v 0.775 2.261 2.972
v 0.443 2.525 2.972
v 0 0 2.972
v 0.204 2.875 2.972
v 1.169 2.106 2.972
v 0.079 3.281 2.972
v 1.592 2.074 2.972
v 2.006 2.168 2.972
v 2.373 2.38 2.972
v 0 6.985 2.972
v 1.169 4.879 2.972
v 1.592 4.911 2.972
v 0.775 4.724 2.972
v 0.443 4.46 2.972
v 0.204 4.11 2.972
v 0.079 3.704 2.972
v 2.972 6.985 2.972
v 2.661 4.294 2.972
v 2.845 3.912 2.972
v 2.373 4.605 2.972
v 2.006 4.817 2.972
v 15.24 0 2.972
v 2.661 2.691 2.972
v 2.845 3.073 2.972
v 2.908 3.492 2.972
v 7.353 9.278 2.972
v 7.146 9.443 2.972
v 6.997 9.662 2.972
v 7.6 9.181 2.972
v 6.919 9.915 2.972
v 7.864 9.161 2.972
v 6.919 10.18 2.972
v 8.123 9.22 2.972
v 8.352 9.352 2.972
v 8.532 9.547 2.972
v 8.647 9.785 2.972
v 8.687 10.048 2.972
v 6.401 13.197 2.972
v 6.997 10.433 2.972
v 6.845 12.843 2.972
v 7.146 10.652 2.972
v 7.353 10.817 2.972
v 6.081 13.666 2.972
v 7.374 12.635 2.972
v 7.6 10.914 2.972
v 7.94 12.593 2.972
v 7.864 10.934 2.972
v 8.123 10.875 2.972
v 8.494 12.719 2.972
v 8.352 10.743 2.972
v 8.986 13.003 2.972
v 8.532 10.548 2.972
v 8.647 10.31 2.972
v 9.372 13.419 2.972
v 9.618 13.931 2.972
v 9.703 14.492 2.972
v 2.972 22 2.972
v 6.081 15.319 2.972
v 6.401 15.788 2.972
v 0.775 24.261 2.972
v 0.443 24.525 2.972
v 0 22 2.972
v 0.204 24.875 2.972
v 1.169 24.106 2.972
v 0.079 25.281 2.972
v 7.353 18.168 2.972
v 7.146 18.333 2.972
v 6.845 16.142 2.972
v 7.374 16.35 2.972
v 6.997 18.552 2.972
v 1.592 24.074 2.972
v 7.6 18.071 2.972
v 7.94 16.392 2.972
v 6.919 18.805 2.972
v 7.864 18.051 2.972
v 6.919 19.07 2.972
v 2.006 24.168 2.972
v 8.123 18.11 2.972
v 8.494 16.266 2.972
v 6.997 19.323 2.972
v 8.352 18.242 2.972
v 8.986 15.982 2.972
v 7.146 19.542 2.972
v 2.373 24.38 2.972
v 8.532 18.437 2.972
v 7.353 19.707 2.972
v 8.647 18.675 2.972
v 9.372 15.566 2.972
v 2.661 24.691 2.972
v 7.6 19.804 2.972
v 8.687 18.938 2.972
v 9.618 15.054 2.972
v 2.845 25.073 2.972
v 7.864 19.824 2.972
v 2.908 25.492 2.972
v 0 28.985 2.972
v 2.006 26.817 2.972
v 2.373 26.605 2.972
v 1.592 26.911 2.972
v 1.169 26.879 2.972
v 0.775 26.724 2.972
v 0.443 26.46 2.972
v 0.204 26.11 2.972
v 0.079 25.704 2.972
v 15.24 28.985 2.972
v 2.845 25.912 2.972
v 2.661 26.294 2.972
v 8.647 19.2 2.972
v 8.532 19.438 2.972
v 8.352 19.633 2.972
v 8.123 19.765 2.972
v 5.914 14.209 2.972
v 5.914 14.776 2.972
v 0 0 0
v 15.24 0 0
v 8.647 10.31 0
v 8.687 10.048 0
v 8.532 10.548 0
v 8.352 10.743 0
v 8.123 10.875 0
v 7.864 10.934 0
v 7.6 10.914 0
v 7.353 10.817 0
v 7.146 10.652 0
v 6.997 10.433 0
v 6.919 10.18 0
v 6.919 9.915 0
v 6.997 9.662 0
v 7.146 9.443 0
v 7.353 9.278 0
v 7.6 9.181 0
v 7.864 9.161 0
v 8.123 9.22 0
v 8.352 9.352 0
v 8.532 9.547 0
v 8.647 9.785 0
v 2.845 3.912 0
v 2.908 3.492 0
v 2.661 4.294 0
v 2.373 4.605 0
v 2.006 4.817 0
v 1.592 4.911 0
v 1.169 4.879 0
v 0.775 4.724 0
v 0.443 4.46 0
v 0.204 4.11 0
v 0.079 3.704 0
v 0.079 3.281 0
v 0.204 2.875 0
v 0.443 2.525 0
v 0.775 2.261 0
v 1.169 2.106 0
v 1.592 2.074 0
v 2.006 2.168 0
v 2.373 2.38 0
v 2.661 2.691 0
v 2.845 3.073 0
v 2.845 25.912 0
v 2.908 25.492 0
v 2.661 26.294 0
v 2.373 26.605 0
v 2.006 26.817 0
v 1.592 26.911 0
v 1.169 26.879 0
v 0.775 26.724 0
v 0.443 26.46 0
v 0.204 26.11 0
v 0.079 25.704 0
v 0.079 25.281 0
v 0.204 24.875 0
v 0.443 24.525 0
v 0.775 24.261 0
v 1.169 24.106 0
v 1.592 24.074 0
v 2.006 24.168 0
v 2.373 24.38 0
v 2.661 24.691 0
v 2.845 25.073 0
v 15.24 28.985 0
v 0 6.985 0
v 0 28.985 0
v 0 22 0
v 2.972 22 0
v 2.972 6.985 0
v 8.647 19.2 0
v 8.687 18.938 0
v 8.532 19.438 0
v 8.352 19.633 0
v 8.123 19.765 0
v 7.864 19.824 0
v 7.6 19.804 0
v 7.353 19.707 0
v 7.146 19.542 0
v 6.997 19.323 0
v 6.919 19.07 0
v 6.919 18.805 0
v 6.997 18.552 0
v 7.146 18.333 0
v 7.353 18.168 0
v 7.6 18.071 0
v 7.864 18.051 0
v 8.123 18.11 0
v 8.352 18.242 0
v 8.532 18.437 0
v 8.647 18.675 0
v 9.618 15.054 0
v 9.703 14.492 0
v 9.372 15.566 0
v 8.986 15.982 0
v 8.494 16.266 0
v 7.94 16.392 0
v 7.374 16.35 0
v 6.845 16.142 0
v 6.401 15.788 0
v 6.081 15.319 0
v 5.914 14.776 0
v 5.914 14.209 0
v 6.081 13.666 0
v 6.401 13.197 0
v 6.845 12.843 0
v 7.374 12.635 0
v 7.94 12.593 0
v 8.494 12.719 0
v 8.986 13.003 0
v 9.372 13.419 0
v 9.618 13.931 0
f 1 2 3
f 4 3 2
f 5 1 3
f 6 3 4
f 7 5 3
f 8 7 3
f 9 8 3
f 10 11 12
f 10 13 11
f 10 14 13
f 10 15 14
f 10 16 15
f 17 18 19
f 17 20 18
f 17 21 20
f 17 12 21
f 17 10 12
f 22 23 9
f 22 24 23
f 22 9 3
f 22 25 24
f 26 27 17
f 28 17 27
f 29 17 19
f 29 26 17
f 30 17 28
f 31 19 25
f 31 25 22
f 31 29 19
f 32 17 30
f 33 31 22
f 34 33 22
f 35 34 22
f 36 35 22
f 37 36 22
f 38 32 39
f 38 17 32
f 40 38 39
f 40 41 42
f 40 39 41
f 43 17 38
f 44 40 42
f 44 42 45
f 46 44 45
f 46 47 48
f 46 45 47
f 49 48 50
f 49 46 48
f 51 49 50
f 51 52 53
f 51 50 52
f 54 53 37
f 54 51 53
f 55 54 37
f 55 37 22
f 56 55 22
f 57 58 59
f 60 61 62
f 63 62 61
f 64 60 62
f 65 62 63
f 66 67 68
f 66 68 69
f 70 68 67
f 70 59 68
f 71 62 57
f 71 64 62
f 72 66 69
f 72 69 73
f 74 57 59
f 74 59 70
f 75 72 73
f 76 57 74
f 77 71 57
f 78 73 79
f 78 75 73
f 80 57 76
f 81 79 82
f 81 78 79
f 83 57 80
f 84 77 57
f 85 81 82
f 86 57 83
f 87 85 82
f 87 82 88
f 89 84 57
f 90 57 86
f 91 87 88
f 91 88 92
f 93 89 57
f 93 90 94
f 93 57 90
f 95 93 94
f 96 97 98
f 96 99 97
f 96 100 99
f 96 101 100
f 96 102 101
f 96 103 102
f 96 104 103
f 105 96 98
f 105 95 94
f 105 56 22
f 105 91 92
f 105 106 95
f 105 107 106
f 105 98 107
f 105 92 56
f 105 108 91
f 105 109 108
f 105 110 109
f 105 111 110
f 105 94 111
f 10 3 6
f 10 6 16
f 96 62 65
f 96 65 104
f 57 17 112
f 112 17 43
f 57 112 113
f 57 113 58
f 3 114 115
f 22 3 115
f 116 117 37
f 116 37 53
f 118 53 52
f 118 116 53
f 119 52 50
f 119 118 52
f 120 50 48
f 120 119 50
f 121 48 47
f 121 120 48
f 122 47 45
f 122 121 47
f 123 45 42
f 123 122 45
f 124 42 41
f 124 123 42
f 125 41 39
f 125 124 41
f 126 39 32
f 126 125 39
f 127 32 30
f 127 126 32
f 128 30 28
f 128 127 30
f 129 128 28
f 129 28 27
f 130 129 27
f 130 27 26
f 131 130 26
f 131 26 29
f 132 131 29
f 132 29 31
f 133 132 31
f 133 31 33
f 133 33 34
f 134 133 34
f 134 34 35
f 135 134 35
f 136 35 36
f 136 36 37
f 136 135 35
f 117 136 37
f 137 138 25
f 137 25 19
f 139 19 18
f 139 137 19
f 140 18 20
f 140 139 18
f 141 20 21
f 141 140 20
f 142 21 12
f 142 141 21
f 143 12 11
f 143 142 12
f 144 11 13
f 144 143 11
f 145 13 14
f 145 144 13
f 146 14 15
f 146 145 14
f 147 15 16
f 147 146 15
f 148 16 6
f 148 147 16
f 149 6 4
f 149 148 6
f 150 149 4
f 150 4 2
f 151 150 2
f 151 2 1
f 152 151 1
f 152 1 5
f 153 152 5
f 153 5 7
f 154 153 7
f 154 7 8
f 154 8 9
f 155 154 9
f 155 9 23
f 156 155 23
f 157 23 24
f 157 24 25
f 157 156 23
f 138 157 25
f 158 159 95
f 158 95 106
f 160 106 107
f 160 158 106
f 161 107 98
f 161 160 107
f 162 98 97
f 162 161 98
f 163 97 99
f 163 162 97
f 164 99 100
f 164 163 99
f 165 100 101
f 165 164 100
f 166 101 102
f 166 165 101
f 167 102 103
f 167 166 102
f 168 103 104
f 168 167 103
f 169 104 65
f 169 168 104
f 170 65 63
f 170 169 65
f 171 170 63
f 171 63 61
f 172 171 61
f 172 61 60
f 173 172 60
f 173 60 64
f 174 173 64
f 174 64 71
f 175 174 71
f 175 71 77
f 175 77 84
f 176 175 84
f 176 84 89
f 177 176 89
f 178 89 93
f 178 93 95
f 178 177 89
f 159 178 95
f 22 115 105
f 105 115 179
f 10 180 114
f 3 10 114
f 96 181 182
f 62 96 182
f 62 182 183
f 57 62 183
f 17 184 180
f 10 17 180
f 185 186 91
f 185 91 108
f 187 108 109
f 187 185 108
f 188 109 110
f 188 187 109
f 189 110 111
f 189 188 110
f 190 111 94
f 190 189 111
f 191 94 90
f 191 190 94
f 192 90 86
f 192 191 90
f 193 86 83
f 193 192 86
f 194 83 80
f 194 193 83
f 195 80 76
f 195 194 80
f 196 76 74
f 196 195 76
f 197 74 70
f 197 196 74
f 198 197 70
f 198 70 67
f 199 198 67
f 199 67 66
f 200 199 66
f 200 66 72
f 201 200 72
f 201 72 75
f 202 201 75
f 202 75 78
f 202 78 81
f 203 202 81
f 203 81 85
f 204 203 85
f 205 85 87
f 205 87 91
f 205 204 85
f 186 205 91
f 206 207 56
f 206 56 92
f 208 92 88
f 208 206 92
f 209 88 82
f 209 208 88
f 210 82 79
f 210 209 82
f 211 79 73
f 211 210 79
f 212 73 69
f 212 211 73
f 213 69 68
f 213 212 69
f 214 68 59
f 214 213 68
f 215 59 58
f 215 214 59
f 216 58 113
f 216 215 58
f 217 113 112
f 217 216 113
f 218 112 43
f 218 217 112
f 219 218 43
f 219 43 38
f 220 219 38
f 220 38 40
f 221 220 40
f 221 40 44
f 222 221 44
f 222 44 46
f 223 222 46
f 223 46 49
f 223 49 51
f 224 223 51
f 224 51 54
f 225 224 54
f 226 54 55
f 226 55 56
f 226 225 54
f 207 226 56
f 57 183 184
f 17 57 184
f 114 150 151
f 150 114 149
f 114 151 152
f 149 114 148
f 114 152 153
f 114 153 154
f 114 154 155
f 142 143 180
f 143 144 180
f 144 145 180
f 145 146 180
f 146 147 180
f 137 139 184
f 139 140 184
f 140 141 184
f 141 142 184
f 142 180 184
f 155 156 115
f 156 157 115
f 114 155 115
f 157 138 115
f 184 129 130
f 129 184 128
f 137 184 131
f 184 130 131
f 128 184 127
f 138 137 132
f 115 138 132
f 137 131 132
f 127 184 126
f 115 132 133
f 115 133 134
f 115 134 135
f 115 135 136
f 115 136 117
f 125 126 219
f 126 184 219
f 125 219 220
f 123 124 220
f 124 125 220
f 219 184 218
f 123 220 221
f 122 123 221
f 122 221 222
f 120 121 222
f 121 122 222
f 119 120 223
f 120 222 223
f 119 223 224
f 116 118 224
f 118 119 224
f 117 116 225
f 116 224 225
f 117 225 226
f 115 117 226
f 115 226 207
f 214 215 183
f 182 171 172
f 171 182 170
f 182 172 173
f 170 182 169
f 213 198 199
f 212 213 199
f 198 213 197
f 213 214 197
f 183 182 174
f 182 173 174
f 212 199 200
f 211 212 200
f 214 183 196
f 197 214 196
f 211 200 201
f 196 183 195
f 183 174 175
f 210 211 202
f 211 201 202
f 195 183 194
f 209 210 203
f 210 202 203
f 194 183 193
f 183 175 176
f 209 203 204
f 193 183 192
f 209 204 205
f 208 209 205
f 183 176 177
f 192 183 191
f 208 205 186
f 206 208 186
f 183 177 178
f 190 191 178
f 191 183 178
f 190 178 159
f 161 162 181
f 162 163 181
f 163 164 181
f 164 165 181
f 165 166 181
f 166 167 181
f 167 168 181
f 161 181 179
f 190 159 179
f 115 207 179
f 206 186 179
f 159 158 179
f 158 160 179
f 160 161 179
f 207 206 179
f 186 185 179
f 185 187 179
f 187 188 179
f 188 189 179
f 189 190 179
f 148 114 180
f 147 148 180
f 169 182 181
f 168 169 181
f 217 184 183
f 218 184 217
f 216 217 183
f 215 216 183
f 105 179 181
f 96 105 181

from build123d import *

# Parameters (mm, degrees)
SKETCH2_R           = 1.4224
SKETCH2_R_2         = 0.889
SKETCH2_R_3         = 1.905
BOSS_EXTRUDE1_DEPTH = 2.9718


with BuildPart() as part:
    # Sketch2 → Boss-Extrude1 (new body)
    with BuildSketch(Plane.XY):
        Polygon((0, 6.985), (0, 0), (15.24, 0), (15.24, 28.985), (0, 28.985), (0, 22), (2.9718, 22), (2.9718, 6.985), align=None)
        with Locations((1.4859, 3.4925)):
            Circle(SKETCH2_R, mode=Mode.SUBTRACT)
        with Locations((7.7978, 10.0475)):
            Circle(SKETCH2_R_2, mode=Mode.SUBTRACT)
        with Locations((7.7978, 14.4925)):
            Circle(SKETCH2_R_3, mode=Mode.SUBTRACT)
        with Locations((1.4859, 25.4925)):
            Circle(SKETCH2_R, mode=Mode.SUBTRACT)
        with Locations((7.7978, 18.9375)):
            Circle(SKETCH2_R_2, mode=Mode.SUBTRACT)
    extrude(amount=BOSS_EXTRUDE1_DEPTH)


solid = part.part
